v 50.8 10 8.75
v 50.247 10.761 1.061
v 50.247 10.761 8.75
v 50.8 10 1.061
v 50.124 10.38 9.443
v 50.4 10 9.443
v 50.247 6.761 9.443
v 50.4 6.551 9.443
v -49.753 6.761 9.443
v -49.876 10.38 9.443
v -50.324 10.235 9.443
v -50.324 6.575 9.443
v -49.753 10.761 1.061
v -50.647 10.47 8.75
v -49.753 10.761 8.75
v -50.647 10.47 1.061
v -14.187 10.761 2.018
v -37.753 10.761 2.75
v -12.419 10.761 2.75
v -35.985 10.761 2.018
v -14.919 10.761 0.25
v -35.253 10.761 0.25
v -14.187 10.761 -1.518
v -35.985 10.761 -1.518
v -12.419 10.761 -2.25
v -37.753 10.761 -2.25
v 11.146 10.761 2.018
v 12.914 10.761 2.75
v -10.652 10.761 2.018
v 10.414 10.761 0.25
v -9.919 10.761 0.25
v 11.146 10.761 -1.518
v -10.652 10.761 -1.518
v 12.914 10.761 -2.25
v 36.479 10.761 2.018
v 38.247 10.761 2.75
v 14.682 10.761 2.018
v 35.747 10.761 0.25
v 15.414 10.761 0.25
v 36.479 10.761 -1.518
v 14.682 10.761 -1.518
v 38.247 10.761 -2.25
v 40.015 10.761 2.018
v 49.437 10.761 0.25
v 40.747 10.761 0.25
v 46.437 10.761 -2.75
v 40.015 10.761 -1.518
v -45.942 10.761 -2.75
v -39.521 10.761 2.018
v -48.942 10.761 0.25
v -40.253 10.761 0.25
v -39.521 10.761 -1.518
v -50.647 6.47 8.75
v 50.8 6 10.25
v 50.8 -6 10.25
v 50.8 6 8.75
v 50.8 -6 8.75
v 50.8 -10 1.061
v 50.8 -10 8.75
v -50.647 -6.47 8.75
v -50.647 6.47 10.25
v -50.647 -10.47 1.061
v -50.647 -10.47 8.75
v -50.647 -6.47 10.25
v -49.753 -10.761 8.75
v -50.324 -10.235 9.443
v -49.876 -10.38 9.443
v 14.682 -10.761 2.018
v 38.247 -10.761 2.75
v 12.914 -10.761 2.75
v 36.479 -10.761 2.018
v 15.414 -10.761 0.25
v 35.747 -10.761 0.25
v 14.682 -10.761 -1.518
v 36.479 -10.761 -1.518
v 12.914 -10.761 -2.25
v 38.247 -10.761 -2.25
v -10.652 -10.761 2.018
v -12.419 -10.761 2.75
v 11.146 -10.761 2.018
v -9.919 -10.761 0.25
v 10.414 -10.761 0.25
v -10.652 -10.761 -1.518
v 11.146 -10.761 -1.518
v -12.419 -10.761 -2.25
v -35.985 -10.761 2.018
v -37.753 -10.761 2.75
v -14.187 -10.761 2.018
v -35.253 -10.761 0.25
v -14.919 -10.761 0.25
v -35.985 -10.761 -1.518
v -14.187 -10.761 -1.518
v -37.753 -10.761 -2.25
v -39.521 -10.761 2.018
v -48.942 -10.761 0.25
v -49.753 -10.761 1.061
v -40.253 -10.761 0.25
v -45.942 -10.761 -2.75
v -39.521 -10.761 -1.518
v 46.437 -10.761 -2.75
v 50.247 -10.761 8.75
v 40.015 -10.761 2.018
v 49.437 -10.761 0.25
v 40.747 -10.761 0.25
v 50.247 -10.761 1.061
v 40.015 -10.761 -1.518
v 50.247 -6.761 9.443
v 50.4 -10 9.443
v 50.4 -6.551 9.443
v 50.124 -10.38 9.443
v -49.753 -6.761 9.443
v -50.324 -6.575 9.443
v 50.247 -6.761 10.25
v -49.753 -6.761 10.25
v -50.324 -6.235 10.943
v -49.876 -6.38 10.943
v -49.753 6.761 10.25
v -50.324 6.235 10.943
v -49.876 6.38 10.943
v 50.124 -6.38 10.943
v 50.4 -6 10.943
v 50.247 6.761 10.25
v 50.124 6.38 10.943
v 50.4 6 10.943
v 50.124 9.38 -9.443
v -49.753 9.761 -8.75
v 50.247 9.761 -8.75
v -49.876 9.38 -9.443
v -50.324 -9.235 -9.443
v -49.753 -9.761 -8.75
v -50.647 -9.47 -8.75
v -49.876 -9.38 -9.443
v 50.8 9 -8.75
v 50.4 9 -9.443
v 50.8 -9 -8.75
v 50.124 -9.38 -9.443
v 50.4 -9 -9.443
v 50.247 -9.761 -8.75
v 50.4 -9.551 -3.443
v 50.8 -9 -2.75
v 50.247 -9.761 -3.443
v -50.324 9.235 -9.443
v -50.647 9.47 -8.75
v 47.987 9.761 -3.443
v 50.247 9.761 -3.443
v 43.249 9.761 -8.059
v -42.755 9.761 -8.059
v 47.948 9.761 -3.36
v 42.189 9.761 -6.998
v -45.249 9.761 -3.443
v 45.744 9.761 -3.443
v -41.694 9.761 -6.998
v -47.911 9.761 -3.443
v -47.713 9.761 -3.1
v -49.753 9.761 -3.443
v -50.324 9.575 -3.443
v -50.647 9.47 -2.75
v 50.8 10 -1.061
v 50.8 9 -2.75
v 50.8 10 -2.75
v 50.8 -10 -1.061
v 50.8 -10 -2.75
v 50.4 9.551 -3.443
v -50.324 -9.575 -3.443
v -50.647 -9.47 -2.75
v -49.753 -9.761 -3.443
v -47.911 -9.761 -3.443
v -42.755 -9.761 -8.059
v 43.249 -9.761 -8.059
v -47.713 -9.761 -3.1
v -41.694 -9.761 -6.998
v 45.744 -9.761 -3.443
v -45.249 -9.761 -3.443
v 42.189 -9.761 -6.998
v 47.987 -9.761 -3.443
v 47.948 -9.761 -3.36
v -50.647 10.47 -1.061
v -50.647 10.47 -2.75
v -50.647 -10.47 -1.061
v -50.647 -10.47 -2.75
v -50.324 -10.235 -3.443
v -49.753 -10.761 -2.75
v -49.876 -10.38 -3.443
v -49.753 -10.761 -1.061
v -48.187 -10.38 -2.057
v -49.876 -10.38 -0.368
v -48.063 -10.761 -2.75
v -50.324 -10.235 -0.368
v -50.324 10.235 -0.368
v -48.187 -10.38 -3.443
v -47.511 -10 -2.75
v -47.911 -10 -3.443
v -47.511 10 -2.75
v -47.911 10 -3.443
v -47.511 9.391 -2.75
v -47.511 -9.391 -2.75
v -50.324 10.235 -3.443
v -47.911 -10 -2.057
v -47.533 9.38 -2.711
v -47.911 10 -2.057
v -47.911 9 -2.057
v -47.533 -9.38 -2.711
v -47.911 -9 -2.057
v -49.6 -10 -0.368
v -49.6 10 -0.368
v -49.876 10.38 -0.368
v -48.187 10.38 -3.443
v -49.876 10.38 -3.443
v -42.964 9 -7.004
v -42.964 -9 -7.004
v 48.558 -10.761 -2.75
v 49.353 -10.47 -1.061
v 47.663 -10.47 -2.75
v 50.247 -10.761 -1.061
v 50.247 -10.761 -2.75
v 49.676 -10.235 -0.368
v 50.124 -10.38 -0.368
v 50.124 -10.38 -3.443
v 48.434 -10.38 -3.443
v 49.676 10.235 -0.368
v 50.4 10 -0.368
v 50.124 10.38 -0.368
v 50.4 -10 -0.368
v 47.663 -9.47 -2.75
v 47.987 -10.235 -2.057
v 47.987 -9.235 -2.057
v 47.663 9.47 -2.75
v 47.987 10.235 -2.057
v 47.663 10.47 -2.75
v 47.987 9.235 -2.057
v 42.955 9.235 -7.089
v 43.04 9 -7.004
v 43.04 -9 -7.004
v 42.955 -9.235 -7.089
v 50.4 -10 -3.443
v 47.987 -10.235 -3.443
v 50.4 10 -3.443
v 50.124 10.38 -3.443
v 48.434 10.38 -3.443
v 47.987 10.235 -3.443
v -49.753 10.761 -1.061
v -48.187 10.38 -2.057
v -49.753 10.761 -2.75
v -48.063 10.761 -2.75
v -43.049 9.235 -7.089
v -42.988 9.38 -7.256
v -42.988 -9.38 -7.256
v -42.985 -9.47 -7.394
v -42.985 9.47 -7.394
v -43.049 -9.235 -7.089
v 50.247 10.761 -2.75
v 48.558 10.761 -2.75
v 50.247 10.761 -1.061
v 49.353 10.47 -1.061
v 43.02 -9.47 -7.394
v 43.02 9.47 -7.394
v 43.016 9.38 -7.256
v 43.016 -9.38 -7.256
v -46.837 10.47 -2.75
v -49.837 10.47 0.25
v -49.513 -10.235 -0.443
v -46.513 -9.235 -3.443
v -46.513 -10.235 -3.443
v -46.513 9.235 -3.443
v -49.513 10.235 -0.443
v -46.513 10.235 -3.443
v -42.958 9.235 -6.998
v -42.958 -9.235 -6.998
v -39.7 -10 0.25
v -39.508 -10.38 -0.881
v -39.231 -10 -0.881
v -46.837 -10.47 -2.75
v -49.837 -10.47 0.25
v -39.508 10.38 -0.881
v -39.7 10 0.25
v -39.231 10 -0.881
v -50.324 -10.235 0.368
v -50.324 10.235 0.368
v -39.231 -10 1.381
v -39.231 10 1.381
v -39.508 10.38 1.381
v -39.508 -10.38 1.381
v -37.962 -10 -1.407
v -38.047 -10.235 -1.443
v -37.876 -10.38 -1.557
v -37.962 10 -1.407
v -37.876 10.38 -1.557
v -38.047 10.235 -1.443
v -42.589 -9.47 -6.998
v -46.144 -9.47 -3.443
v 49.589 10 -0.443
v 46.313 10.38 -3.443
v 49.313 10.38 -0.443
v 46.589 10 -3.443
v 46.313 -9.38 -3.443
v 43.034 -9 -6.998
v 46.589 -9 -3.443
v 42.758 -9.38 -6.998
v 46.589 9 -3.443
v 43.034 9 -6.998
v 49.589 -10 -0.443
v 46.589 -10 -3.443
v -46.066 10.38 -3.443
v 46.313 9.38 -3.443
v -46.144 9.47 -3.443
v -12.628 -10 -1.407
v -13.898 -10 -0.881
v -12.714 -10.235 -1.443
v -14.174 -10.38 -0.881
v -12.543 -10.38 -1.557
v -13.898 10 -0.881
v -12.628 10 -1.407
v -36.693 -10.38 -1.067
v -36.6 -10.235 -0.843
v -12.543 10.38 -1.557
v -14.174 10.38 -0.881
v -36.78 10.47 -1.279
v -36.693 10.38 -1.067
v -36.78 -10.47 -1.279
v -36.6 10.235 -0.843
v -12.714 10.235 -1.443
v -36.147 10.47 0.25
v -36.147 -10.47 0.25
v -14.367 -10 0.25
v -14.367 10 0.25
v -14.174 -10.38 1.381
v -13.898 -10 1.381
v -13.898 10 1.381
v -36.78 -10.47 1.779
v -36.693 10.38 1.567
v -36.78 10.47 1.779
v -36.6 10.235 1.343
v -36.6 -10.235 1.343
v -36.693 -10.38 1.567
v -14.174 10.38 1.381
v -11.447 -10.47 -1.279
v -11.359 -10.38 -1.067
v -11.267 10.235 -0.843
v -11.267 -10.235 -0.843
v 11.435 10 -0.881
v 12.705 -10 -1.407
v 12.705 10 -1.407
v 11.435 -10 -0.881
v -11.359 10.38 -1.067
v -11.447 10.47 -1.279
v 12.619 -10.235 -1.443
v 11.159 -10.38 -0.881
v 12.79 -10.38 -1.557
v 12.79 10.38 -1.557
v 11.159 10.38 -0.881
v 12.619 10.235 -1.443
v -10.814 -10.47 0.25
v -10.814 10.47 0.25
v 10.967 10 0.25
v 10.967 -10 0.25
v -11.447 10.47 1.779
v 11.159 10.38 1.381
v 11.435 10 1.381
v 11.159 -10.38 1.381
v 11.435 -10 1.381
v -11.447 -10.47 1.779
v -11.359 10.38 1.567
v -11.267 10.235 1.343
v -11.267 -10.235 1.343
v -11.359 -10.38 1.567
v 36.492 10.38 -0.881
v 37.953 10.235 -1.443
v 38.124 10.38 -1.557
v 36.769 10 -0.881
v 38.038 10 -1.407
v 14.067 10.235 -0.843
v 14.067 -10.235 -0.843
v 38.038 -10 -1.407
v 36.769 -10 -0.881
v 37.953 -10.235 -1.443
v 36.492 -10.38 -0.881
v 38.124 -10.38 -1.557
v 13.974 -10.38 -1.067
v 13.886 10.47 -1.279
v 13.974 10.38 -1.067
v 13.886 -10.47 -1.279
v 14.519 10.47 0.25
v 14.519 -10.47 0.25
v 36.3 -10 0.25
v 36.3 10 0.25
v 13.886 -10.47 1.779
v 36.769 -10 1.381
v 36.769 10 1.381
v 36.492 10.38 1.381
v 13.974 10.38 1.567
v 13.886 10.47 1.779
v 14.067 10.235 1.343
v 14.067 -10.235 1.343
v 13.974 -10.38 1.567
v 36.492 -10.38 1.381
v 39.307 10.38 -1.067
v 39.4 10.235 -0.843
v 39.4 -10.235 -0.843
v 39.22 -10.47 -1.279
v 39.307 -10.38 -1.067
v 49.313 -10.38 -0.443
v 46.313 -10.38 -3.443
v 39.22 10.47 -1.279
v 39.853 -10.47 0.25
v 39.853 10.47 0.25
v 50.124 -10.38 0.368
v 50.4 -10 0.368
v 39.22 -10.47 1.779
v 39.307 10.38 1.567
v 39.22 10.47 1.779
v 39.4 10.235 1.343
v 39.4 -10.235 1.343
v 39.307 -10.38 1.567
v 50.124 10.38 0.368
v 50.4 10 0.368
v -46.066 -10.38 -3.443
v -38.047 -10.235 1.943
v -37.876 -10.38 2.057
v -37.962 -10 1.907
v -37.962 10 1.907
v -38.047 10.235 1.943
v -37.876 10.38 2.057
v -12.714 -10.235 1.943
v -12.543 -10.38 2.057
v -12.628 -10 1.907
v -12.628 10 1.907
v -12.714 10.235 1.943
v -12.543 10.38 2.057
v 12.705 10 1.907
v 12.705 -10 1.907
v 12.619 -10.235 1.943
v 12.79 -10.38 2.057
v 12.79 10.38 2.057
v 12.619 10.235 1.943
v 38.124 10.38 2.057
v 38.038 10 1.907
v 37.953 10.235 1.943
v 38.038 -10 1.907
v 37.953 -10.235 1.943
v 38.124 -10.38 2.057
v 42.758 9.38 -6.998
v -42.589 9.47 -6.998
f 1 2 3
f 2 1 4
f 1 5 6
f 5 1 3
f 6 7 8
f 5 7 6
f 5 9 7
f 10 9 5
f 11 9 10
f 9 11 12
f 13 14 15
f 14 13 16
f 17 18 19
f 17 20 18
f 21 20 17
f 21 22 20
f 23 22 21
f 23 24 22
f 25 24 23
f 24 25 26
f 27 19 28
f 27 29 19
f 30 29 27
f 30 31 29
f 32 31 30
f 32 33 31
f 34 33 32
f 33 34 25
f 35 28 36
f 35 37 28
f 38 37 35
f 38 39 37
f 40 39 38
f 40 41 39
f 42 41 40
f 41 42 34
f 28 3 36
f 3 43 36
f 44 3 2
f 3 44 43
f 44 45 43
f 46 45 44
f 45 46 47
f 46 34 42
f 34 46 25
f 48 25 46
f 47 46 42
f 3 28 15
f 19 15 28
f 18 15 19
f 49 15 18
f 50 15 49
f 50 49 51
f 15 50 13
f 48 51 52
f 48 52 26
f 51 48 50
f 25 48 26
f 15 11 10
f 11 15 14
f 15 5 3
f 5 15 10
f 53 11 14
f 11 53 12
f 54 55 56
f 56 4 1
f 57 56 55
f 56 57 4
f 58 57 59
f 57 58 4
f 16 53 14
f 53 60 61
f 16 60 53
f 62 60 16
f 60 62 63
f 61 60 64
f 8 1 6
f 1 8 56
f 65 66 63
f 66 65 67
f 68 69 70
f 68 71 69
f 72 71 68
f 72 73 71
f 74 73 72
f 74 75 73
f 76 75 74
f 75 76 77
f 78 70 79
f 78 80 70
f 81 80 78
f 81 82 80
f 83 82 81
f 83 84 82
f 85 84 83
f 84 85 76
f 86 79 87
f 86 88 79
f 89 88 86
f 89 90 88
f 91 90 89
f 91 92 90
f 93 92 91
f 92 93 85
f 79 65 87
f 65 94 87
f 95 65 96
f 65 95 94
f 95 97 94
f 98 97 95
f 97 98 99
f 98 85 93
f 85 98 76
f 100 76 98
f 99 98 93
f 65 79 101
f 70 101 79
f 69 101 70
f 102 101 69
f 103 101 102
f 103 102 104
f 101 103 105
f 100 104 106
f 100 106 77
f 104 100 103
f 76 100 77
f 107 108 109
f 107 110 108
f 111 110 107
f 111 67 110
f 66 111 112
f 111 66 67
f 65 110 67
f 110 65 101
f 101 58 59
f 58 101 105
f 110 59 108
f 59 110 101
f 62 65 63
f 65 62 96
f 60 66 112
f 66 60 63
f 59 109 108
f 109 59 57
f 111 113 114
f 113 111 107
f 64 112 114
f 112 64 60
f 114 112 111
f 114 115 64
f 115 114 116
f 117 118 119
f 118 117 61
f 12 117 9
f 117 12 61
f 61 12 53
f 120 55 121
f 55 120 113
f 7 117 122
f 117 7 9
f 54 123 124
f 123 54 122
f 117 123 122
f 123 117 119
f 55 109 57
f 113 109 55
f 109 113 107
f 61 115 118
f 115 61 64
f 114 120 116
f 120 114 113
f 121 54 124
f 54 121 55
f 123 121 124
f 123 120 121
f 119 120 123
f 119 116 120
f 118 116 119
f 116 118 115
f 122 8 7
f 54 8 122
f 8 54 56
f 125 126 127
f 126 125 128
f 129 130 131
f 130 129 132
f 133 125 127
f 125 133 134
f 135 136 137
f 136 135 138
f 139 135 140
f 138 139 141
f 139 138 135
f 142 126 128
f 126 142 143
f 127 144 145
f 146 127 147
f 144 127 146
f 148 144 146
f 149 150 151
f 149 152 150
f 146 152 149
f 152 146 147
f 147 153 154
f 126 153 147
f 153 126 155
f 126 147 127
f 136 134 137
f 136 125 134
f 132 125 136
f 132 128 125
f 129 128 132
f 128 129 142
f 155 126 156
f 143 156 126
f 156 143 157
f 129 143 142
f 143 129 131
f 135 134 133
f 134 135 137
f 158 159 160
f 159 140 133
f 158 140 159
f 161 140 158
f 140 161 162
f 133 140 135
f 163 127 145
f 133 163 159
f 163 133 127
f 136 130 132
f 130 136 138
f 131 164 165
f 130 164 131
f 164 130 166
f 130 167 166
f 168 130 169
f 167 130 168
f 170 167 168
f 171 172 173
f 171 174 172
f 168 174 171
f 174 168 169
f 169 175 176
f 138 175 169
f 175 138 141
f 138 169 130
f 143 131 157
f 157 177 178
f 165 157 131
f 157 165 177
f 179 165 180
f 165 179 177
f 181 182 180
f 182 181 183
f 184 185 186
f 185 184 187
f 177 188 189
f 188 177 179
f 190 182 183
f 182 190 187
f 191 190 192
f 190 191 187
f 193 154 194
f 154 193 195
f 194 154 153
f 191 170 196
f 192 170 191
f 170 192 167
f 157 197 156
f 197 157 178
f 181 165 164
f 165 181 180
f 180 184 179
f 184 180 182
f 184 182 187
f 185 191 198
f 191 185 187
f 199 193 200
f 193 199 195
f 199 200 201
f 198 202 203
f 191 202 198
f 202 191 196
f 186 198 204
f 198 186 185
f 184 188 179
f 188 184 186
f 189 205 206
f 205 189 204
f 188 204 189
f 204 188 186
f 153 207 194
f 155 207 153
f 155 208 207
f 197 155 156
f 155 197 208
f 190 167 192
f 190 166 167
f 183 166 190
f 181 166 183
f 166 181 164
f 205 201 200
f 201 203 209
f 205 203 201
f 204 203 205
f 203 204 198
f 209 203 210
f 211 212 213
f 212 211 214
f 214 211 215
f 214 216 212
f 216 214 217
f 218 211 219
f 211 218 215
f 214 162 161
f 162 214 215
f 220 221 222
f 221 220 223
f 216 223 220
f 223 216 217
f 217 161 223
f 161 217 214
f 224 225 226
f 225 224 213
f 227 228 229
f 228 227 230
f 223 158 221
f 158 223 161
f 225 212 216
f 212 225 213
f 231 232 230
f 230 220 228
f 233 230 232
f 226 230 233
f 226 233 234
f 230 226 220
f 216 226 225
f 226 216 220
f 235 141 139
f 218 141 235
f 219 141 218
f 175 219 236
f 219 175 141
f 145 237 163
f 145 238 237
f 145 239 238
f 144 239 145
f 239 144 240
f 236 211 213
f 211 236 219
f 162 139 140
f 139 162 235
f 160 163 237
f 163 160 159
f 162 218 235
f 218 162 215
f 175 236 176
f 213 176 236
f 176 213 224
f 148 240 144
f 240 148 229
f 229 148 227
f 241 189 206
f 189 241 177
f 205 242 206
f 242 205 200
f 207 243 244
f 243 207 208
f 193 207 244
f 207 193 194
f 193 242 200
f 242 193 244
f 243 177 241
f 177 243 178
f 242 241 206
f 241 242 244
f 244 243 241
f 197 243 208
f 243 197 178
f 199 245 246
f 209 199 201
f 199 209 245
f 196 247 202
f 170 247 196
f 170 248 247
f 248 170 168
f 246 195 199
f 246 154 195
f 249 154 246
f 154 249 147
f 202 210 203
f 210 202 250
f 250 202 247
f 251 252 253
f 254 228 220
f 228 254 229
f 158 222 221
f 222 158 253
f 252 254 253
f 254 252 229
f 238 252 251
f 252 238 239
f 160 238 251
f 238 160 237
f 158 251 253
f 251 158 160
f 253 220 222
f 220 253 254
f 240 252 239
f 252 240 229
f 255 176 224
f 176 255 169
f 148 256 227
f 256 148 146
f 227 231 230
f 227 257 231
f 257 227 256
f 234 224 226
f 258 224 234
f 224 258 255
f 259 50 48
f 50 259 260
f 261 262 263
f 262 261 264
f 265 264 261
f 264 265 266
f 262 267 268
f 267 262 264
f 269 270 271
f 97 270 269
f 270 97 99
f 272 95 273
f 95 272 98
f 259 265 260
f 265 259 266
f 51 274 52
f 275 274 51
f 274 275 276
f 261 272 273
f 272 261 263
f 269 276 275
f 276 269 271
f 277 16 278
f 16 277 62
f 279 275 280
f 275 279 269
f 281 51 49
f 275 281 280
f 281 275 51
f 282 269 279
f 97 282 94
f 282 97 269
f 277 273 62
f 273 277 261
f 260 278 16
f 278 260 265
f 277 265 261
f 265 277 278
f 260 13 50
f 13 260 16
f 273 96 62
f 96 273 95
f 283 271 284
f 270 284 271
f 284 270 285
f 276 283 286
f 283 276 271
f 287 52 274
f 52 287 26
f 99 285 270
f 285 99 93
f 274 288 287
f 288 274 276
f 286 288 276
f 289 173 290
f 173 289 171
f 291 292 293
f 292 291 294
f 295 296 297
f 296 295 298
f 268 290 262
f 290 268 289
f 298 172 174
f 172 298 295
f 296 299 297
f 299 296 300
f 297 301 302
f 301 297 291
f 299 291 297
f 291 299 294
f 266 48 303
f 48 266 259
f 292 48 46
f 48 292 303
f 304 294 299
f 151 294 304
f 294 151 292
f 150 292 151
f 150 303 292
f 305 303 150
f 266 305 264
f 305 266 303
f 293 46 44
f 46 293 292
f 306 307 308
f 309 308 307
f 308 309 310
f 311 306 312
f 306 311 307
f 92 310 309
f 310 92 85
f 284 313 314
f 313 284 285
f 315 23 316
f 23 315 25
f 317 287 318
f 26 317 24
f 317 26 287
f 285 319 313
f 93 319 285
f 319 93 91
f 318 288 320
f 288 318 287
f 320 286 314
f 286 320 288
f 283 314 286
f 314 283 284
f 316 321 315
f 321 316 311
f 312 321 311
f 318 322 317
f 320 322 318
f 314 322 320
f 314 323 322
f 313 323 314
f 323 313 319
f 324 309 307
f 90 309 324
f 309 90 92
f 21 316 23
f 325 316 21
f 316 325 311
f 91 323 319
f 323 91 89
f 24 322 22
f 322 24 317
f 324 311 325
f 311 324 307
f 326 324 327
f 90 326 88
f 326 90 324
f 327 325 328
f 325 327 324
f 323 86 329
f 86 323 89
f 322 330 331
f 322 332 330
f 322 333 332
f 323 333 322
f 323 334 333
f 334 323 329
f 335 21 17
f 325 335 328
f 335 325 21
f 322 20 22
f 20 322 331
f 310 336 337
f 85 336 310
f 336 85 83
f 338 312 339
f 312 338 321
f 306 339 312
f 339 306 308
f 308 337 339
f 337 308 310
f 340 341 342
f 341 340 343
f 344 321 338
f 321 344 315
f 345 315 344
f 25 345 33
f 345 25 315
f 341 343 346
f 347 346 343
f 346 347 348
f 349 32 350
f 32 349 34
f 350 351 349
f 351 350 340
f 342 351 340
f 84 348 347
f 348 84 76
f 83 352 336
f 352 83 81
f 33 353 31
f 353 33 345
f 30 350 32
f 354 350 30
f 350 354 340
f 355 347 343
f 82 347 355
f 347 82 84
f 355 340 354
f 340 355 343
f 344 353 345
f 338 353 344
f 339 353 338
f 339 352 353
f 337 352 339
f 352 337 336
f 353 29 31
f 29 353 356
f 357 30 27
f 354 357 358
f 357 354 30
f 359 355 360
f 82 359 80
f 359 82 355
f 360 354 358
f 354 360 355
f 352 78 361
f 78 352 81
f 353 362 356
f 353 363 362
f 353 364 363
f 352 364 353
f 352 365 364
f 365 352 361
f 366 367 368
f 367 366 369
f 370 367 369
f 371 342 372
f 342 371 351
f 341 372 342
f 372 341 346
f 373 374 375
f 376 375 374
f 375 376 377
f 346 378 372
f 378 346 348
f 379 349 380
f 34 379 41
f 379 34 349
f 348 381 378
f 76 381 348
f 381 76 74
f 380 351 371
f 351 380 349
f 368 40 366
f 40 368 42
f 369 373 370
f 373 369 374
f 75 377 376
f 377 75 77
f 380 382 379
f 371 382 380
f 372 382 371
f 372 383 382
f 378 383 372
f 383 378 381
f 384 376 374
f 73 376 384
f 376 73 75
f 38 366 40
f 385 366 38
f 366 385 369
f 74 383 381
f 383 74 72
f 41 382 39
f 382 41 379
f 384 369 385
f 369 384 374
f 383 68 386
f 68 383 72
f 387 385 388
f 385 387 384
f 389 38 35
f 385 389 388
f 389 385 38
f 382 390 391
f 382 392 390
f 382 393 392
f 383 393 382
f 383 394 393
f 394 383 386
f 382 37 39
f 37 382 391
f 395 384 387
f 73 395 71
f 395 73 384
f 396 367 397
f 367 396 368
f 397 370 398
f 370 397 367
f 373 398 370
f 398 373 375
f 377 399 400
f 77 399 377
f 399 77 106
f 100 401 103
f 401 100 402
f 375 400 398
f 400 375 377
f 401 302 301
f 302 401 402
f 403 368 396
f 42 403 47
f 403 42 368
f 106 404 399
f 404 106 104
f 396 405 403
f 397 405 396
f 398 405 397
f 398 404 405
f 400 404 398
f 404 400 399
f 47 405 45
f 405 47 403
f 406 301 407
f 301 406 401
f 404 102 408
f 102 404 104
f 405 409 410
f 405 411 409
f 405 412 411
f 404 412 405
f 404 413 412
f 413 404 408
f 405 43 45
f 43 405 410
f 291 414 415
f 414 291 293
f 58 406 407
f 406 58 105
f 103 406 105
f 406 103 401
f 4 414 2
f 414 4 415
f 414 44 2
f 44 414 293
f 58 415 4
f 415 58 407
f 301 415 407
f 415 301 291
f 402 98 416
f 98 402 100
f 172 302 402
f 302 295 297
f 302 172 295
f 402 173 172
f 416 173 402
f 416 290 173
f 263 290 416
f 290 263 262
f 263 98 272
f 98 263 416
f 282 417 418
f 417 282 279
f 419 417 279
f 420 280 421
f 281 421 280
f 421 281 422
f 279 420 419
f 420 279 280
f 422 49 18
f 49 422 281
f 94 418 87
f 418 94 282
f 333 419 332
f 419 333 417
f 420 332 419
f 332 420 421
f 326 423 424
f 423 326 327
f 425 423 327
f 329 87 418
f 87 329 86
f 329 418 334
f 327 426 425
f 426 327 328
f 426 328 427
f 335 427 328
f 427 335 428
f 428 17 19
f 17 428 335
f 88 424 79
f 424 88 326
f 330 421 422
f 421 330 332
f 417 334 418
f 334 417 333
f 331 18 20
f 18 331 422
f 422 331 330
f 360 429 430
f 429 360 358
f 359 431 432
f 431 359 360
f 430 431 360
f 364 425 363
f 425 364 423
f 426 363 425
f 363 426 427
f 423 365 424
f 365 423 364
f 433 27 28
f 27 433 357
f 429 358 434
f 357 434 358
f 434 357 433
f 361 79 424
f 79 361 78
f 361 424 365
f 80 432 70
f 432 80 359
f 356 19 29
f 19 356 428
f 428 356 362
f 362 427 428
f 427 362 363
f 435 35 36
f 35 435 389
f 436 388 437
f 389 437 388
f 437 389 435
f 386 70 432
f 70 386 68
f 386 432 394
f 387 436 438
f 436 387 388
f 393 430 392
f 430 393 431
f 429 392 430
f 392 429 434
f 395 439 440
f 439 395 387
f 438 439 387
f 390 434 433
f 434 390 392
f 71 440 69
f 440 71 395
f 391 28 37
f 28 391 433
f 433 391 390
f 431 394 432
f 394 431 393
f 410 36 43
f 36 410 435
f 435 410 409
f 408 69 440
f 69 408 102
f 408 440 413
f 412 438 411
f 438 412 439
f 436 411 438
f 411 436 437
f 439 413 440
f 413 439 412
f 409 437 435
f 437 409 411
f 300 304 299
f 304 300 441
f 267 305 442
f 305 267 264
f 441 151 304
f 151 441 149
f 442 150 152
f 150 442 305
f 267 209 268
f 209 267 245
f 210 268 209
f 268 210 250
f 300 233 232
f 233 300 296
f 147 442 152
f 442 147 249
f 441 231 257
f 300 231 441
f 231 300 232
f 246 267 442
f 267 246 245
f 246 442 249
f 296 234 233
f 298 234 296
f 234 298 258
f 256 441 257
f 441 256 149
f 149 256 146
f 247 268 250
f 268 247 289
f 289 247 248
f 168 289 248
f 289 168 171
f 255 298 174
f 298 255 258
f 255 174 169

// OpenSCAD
// Parameters
rail_L = 100; //[50:200:1]
rail_W = 20; //[10:40:0.5]
rail_H = 17.5; //[8.75:35:0.5]
top_flat_W = 12; //[6:24:0.5]
top_flat_H = 2.5; //[1.25:5:0.25]
side_undercut_depth = 2; //[1:4:0.25]
side_undercut_H = 6; //[3:12:0.5]
mount_hole_d = 5; //[3:8:0.5]
mount_hole_count = 4; //[2:8:1]
end_margin = 12; //[6:24:1]
chamfer_L = 1.5; //[0.5:4:0.25]
fillet_r = 0.8; //[0.2:2:0.1]
overlap = 1; //[0.5:2:0.1]
marking_depth = 0.3; //[0.1:1:0.1]

// Rail Body
module rail_body() {
  cube([rail_L, rail_W, rail_H], center=true);
}

// Top Running Surfaces
module top_running_surfaces() {
  translate([0, 0, rail_H/2 + top_flat_H/2 - overlap])
    cube([rail_L, top_flat_W, top_flat_H], center=true);
}

// Side Undercuts
module side_undercut_left() {
  translate([0, -(rail_W/2 - side_undercut_depth/2 + overlap), -(rail_H/2 - side_undercut_H/2)])
    cube([rail_L + 2*overlap, side_undercut_depth, side_undercut_H], center=true);
}

module side_undercut_right() {
  translate([0, (rail_W/2 - side_undercut_depth/2 + overlap), -(rail_H/2 - side_undercut_H/2)])
    cube([rail_L + 2*overlap, side_undercut_depth, side_undercut_H], center=true);
}

// Mounting Holes
module mount_hole(position) {
  translate(position)
    rotate([90, 0, 0])
      cylinder(h=rail_H + top_flat_H + 2*overlap, r=mount_hole_d/2, center=true);
}

// End Chamfers
module end_chamfer_pos() {
  translate([rail_L/2 - chamfer_L/2 + overlap, 0, top_flat_H/2 - overlap])
    rotate([0, 45, 0])
      cube([chamfer_L, rail_W + 2*overlap, rail_H + top_flat_H + 2*overlap], center=true);
}

module end_chamfer_neg() {
  translate([-rail_L/2 + chamfer_L/2 - overlap, 0, top_flat_H/2 - overlap])
    rotate([0, -45, 0])
      cube([chamfer_L, rail_W + 2*overlap, rail_H + top_flat_H + 2*overlap], center=true);
}

// Fillet Sphere
module fillet_sphere() {
  sphere(r=fillet_r, center=true);
}

// Engraved Markings
module engraved_markings() {
  translate([0, 0, rail_H/2 + top_flat_H - marking_depth/2])
    cube([rail_L/5, top_flat_W/2, marking_depth], center=true);
}

// Final Rail Assembly
module rail_final() {
  difference() {
    minkowski() {
      difference() {
        difference() {
          difference() {
            union() {
              rail_body();
              top_running_surfaces();
            }
            side_undercut_left();
            side_undercut_right();
          }
          for (i = [0:mount_hole_count-1]) {
            mount_hole([-rail_L/2 + end_margin + i*(rail_L - 2*end_margin)/(mount_hole_count-1), 0, top_flat_H/2 - overlap]);
          }
        }
        end_chamfer_pos();
        end_chamfer_neg();
      }
      fillet_sphere();
    }
    engraved_markings();
  }
}

// Render the final rail
color("DimGray") rail_final();
